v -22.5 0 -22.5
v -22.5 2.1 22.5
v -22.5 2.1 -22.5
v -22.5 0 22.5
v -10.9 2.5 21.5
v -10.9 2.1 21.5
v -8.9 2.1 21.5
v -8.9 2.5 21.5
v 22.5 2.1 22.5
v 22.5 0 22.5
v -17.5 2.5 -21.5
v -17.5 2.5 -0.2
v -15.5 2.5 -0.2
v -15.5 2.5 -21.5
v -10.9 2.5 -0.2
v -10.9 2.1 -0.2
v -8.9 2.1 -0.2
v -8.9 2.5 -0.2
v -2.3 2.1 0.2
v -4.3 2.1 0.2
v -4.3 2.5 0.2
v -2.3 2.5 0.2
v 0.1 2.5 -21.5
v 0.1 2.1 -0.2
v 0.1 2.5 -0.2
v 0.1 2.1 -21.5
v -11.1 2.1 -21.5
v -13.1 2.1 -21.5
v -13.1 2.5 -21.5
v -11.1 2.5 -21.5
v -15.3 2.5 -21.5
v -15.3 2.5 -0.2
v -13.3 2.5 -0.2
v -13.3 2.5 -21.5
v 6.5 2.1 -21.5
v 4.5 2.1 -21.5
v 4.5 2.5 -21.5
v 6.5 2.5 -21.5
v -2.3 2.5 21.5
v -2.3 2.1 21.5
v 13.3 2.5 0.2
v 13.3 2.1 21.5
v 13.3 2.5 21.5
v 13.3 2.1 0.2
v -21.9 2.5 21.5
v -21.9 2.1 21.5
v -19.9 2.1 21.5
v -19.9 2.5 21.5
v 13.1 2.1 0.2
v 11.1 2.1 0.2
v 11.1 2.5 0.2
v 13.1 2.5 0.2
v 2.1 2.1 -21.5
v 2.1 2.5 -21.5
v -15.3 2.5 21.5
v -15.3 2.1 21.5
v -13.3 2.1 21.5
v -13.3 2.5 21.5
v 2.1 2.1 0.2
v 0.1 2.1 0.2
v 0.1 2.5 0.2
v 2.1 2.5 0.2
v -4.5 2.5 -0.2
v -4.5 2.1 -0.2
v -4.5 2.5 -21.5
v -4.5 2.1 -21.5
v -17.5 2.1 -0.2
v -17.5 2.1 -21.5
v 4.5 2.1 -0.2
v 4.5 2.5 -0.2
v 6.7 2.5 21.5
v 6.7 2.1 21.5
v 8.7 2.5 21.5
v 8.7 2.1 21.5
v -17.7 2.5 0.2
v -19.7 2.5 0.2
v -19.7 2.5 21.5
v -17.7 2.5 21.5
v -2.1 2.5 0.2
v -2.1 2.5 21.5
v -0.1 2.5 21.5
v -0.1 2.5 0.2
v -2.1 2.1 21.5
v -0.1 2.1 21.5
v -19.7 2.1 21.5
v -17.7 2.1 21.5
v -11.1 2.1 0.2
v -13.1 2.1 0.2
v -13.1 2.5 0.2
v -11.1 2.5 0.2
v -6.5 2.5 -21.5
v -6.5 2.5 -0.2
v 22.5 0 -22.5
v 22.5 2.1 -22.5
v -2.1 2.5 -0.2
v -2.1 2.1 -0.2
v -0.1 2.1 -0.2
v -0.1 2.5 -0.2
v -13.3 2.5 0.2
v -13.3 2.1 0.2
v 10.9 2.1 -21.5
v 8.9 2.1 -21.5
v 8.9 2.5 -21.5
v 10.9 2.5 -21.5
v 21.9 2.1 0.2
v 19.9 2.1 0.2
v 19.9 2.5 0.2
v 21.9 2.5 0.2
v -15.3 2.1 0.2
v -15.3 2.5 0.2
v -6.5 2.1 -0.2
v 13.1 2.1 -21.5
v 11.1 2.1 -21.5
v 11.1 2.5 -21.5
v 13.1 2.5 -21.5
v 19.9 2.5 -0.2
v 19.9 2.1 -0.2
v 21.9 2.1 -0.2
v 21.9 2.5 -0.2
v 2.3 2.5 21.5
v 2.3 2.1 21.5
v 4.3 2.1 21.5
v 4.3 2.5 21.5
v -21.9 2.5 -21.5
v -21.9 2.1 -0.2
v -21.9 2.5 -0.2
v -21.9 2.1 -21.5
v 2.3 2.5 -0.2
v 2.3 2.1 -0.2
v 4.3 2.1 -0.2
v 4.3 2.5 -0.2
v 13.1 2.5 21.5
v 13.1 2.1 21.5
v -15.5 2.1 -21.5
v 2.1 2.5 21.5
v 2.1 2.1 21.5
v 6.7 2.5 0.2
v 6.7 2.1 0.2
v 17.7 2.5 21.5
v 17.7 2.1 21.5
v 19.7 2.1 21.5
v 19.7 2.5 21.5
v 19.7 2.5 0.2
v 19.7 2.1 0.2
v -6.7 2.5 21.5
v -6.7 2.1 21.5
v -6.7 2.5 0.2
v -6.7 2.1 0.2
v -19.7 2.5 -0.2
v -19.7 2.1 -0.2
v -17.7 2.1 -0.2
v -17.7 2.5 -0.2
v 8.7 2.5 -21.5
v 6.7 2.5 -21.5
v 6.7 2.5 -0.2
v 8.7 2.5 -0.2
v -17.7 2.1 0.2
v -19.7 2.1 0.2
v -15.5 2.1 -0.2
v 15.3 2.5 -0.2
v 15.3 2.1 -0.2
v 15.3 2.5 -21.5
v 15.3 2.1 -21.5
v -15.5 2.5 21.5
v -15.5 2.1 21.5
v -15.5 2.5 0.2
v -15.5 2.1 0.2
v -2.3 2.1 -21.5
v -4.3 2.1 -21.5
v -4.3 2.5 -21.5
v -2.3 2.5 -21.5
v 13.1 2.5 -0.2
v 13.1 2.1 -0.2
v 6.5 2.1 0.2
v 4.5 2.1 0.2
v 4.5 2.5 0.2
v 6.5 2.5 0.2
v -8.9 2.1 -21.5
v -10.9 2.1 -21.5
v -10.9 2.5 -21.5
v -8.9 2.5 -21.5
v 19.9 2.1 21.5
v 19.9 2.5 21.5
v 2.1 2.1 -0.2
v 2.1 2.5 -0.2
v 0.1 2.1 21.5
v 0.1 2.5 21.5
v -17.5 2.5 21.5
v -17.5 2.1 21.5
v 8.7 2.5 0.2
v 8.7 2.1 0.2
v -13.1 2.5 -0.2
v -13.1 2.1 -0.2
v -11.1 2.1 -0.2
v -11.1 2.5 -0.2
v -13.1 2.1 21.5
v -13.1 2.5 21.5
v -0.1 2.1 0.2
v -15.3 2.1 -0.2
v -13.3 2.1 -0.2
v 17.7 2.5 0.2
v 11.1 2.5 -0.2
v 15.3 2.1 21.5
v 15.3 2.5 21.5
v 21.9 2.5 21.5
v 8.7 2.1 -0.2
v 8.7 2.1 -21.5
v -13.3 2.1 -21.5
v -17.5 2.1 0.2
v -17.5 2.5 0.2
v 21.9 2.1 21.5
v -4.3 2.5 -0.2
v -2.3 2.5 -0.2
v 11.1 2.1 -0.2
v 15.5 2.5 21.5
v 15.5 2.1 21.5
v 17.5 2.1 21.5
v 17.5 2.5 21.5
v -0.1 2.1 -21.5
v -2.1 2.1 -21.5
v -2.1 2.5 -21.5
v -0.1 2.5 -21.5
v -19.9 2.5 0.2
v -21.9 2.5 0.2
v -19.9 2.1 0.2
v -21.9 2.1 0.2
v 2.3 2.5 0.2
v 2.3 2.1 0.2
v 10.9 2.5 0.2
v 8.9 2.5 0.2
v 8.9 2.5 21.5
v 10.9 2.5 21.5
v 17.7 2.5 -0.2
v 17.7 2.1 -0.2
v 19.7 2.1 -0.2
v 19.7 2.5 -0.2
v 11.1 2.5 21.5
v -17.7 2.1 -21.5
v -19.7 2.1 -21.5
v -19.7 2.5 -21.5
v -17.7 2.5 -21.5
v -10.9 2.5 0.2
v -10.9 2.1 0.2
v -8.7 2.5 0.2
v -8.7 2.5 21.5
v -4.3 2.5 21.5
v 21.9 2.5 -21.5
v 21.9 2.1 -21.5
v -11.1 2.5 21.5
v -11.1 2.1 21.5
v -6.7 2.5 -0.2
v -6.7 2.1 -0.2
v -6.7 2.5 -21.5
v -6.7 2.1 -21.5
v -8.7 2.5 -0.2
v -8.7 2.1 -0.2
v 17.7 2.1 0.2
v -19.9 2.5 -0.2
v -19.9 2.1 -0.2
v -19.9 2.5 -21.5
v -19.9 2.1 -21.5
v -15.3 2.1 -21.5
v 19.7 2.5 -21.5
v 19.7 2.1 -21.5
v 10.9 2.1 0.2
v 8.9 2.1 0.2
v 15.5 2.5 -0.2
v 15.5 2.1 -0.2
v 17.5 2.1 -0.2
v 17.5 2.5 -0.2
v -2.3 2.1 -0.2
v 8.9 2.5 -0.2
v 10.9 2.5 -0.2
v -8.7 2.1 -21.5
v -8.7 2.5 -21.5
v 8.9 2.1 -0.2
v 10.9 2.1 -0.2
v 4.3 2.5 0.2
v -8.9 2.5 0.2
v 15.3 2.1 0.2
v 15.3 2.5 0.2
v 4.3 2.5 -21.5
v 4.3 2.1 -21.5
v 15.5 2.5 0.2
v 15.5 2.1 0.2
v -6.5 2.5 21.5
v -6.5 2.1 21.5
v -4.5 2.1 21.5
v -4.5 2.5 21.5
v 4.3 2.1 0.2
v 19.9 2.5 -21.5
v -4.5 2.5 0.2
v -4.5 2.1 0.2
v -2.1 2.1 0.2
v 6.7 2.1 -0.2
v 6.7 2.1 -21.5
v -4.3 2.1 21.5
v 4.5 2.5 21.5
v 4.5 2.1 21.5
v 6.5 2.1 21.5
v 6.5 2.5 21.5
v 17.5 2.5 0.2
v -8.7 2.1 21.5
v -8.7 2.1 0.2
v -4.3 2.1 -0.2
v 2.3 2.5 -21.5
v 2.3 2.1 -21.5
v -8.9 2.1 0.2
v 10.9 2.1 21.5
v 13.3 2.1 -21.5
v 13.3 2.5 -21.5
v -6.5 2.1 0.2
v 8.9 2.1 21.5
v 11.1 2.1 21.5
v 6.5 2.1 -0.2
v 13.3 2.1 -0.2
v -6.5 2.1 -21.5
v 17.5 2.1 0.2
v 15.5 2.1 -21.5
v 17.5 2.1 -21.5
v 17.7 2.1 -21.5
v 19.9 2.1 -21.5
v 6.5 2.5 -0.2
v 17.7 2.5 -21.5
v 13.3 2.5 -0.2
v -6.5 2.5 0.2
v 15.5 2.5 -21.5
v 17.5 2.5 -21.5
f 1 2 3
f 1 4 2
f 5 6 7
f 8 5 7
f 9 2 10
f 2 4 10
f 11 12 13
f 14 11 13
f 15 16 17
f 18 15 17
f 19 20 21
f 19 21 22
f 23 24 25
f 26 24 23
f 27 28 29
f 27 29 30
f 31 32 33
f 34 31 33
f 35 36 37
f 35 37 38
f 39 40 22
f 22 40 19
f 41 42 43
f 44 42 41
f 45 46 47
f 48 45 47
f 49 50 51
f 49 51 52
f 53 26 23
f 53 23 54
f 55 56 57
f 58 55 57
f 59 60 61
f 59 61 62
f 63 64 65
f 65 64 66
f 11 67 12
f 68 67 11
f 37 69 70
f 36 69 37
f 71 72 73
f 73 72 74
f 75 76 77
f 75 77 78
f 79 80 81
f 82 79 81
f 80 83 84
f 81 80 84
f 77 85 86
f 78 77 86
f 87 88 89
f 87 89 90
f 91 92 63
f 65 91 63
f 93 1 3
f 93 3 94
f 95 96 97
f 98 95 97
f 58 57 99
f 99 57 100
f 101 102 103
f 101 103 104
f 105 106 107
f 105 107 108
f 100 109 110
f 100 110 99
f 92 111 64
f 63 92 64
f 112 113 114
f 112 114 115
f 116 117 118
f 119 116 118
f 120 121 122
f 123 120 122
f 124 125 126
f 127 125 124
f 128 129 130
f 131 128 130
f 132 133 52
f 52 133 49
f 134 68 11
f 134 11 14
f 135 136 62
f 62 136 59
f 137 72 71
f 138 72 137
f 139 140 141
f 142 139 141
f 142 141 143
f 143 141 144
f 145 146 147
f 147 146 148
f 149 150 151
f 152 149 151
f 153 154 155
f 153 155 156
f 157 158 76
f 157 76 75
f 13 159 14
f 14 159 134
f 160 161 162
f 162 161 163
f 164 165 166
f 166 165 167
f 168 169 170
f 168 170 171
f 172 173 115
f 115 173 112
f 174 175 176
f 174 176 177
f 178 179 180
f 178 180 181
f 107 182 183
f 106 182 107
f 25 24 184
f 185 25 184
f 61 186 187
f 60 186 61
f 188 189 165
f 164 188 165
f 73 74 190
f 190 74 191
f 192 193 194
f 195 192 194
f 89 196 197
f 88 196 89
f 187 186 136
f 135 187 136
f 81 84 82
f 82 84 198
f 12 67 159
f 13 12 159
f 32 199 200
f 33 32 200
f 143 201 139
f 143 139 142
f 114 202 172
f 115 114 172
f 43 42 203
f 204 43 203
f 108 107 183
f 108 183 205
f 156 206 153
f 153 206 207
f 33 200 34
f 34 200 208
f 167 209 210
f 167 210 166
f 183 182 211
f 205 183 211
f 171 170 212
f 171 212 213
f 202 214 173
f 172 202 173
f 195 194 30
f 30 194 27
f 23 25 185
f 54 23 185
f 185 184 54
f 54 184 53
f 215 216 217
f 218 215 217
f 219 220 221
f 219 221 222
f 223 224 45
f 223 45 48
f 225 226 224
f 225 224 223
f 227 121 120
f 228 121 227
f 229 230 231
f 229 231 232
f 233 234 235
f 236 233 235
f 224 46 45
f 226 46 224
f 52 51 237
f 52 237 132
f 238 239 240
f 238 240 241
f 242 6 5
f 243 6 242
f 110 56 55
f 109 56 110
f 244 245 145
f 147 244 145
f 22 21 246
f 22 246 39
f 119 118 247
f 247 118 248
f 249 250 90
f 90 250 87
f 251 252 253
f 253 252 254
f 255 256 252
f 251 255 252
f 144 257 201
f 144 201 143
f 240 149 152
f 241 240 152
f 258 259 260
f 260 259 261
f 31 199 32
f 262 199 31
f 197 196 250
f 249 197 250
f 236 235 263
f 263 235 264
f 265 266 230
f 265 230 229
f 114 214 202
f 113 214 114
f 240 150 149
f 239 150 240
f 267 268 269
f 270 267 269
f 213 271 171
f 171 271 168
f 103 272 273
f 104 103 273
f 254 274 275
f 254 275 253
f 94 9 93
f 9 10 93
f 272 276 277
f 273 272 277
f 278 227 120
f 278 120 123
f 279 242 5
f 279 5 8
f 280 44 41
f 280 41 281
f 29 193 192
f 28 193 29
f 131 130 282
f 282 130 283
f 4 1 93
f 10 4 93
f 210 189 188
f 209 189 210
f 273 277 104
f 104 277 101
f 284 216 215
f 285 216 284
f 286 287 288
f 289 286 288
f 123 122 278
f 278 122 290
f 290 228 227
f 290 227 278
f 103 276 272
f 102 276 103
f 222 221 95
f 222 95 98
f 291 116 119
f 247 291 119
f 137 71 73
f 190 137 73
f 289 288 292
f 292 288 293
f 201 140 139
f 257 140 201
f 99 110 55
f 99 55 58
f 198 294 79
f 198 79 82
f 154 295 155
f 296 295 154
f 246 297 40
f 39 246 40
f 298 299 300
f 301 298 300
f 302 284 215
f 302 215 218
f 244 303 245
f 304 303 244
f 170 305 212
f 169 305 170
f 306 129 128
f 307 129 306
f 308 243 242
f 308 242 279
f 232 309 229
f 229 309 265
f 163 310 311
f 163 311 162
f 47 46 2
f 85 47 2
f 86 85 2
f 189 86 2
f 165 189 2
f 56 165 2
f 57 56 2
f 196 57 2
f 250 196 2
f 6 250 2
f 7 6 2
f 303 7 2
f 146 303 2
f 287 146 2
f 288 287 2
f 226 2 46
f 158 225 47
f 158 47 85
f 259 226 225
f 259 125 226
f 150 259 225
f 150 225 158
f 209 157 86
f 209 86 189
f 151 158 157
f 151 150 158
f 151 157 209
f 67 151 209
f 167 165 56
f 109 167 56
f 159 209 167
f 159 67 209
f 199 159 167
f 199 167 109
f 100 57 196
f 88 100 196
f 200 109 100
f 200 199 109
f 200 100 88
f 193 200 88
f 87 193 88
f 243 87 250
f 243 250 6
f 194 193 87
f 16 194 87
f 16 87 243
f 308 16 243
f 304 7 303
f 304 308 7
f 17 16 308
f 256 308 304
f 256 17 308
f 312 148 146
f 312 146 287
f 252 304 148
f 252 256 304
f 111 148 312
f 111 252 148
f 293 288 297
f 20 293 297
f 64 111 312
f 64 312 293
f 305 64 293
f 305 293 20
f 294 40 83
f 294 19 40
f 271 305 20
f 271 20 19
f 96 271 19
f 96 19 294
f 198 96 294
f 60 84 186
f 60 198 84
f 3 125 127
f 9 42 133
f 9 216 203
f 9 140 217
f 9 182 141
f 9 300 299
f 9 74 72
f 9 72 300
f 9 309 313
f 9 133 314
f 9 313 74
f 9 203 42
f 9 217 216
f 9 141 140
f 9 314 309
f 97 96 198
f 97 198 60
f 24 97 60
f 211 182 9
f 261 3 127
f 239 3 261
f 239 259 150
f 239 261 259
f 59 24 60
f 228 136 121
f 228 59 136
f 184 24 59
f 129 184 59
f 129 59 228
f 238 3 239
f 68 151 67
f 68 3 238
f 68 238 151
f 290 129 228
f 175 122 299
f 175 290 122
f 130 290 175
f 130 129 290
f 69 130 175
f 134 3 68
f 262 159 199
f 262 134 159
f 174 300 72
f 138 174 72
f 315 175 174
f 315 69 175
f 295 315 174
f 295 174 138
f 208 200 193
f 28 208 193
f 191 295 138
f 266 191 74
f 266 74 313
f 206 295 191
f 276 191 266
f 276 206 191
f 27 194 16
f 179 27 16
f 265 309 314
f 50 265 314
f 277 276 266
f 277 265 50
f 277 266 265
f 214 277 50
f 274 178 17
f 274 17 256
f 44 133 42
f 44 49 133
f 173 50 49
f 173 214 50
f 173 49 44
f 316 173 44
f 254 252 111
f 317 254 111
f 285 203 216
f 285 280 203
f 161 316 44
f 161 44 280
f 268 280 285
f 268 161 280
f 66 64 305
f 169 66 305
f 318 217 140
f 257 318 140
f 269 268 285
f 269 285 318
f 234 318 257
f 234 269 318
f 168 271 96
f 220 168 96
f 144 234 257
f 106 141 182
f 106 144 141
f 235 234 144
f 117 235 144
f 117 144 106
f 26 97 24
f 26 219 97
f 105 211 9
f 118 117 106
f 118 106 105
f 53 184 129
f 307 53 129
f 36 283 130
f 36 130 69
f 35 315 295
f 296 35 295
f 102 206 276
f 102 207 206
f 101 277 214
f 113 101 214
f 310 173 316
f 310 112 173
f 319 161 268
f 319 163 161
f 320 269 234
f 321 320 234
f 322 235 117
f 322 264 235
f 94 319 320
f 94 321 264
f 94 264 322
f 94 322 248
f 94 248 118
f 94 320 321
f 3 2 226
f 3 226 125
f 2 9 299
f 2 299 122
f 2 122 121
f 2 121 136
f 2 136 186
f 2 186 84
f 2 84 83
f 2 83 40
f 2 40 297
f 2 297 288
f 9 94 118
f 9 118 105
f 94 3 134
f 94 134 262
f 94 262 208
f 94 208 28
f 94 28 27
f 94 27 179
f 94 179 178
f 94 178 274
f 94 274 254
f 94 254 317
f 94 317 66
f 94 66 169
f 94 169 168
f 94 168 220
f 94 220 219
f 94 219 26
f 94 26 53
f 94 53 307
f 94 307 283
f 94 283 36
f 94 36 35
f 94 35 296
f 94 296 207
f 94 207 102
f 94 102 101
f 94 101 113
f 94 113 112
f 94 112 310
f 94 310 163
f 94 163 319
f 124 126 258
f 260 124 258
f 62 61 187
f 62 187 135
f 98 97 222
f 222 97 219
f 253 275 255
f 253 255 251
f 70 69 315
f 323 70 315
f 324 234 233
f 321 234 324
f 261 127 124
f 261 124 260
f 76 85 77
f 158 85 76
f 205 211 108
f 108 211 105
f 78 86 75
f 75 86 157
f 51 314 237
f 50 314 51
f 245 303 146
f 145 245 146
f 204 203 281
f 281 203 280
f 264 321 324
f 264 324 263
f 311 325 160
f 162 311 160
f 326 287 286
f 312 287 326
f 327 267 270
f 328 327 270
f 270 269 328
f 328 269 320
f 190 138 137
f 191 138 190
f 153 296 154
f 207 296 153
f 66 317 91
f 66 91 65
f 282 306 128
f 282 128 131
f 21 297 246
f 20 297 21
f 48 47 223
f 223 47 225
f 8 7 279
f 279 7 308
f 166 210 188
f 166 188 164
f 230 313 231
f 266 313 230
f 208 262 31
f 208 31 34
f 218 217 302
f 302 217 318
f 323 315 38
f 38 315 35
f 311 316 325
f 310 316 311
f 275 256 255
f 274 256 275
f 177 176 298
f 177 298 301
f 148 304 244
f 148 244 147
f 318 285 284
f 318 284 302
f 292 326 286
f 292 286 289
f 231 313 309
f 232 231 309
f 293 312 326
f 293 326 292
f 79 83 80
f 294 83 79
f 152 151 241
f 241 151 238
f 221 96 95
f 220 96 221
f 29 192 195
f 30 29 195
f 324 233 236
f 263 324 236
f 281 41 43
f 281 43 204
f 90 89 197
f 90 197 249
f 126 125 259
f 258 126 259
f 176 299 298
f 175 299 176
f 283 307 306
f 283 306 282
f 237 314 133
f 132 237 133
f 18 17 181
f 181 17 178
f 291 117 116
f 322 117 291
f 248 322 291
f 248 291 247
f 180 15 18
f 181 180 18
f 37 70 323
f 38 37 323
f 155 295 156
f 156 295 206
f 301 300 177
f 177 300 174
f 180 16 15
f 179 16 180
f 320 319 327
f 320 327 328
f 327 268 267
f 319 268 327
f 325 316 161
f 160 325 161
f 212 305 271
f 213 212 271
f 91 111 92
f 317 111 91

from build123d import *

# Parameters (mm, degrees)
SKETCH1_W           = 45
SKETCH1_H           = 45
BOSS_EXTRUDE1_DEPTH = 0.1
SKETCH2_W           = 45
SKETCH2_H           = 45
BOSS_EXTRUDE2_DEPTH = 2
SKETCH5_W           = 2
SKETCH5_H           = 21.3
BOSS_EXTRUDE3_DEPTH = 0.4


with BuildPart() as part:
    # Sketch1 → Boss-Extrude1 (new body)
    with BuildSketch(Plane(origin=(0, 0, 0), x_dir=(1, 0, 0), z_dir=(0, 1, 0))):
        Rectangle(SKETCH1_W, SKETCH1_H)
    extrude(amount=BOSS_EXTRUDE1_DEPTH)

    # Sketch2 → Boss-Extrude2 (add)
    with BuildSketch(Plane(origin=(0, 0.1, 0), x_dir=(1, 0, 0), z_dir=(0, 1, 0))):
        Rectangle(SKETCH2_W, SKETCH2_H)
    extrude(amount=BOSS_EXTRUDE2_DEPTH)

    # Sketch5 → Boss-Extrude3 (add)
    with BuildSketch(Plane(origin=(0, 2.1, 0), x_dir=(1, 0, 0), z_dir=(0, 1, 0))):
        with Locations((-20.9, 10.85)):
            Rectangle(SKETCH5_W, SKETCH5_H)
        with Locations((-18.7, 10.85)):
            Rectangle(SKETCH5_W, SKETCH5_H)
        with Locations((-16.5, 10.85)):
            Rectangle(SKETCH5_W, SKETCH5_H)
        with Locations((-14.3, 10.85)):
            Rectangle(SKETCH5_W, SKETCH5_H)
        with Locations((-12.1, 10.85)):
            Rectangle(SKETCH5_W, SKETCH5_H)
        with Locations((-9.9, 10.85)):
            Rectangle(SKETCH5_W, SKETCH5_H)
        with Locations((-7.7, 10.85)):
            Rectangle(SKETCH5_W, SKETCH5_H)
        with Locations((-5.5, 10.85)):
            Rectangle(SKETCH5_W, SKETCH5_H)
        with Locations((-3.3, 10.85)):
            Rectangle(SKETCH5_W, SKETCH5_H)
        with Locations((-1.1, 10.85)):
            Rectangle(SKETCH5_W, SKETCH5_H)
        with Locations((1.1, 10.85)):
            Rectangle(SKETCH5_W, SKETCH5_H)
        with Locations((3.3, 10.85)):
            Rectangle(SKETCH5_W, SKETCH5_H)
        with Locations((7.7, 10.85)):
            Rectangle(SKETCH5_W, SKETCH5_H)
        with Locations((9.9, 10.85)):
            Rectangle(SKETCH5_W, SKETCH5_H)
        with Locations((12.1, 10.85)):
            Rectangle(SKETCH5_W, SKETCH5_H)
        with Locations((14.3, 10.85)):
            Rectangle(SKETCH5_W, SKETCH5_H)
        with Locations((16.5, 10.85)):
            Rectangle(SKETCH5_W, SKETCH5_H)
        with Locations((18.7, 10.85)):
            Rectangle(SKETCH5_W, SKETCH5_H)
        with Locations((20.9, 10.85)):
            Rectangle(SKETCH5_W, SKETCH5_H)
        with Locations((20.9, -10.85)):
            Rectangle(SKETCH5_W, SKETCH5_H)
        with Locations((14.3, -10.85)):
            Rectangle(SKETCH5_W, SKETCH5_H)
        with Locations((12.1, -10.85)):
            Rectangle(SKETCH5_W, SKETCH5_H)
        with Locations((9.9, -10.85)):
            Rectangle(SKETCH5_W, SKETCH5_H)
        with Locations((7.7, -10.85)):
            Rectangle(SKETCH5_W, SKETCH5_H)
        with Locations((5.5, -10.85)):
            Rectangle(SKETCH5_W, SKETCH5_H)
        with Locations((1.1, -10.85)):
            Rectangle(SKETCH5_W, SKETCH5_H)
        with Locations((-1.1, -10.85)):
            Rectangle(SKETCH5_W, SKETCH5_H)
        with Locations((-3.3, -10.85)):
            Rectangle(SKETCH5_W, SKETCH5_H)
        with Locations((-5.5, -10.85)):
            Rectangle(SKETCH5_W, SKETCH5_H)
        with Locations((-7.7, -10.85)):
            Rectangle(SKETCH5_W, SKETCH5_H)
        with Locations((-9.9, -10.85)):
            Rectangle(SKETCH5_W, SKETCH5_H)
        with Locations((-12.1, -10.85)):
            Rectangle(SKETCH5_W, SKETCH5_H)
        with Locations((-14.3, -10.85)):
            Rectangle(SKETCH5_W, SKETCH5_H)
        with Locations((-16.5, -10.85)):
            Rectangle(SKETCH5_W, SKETCH5_H)
        with Locations((-18.7, -10.85)):
            Rectangle(SKETCH5_W, SKETCH5_H)
        with Locations((-20.9, -10.85)):
            Rectangle(SKETCH5_W, SKETCH5_H)
        with Locations((5.5, 10.85)):
            Rectangle(SKETCH5_W, SKETCH5_H)
        with Locations((18.7, -10.85)):
            Rectangle(SKETCH5_W, SKETCH5_H)
        with Locations((16.5, -10.85)):
            Rectangle(SKETCH5_W, SKETCH5_H)
        with Locations((3.3, -10.85)):
            Rectangle(SKETCH5_W, SKETCH5_H)
    extrude(amount=BOSS_EXTRUDE3_DEPTH)


solid = part.part
